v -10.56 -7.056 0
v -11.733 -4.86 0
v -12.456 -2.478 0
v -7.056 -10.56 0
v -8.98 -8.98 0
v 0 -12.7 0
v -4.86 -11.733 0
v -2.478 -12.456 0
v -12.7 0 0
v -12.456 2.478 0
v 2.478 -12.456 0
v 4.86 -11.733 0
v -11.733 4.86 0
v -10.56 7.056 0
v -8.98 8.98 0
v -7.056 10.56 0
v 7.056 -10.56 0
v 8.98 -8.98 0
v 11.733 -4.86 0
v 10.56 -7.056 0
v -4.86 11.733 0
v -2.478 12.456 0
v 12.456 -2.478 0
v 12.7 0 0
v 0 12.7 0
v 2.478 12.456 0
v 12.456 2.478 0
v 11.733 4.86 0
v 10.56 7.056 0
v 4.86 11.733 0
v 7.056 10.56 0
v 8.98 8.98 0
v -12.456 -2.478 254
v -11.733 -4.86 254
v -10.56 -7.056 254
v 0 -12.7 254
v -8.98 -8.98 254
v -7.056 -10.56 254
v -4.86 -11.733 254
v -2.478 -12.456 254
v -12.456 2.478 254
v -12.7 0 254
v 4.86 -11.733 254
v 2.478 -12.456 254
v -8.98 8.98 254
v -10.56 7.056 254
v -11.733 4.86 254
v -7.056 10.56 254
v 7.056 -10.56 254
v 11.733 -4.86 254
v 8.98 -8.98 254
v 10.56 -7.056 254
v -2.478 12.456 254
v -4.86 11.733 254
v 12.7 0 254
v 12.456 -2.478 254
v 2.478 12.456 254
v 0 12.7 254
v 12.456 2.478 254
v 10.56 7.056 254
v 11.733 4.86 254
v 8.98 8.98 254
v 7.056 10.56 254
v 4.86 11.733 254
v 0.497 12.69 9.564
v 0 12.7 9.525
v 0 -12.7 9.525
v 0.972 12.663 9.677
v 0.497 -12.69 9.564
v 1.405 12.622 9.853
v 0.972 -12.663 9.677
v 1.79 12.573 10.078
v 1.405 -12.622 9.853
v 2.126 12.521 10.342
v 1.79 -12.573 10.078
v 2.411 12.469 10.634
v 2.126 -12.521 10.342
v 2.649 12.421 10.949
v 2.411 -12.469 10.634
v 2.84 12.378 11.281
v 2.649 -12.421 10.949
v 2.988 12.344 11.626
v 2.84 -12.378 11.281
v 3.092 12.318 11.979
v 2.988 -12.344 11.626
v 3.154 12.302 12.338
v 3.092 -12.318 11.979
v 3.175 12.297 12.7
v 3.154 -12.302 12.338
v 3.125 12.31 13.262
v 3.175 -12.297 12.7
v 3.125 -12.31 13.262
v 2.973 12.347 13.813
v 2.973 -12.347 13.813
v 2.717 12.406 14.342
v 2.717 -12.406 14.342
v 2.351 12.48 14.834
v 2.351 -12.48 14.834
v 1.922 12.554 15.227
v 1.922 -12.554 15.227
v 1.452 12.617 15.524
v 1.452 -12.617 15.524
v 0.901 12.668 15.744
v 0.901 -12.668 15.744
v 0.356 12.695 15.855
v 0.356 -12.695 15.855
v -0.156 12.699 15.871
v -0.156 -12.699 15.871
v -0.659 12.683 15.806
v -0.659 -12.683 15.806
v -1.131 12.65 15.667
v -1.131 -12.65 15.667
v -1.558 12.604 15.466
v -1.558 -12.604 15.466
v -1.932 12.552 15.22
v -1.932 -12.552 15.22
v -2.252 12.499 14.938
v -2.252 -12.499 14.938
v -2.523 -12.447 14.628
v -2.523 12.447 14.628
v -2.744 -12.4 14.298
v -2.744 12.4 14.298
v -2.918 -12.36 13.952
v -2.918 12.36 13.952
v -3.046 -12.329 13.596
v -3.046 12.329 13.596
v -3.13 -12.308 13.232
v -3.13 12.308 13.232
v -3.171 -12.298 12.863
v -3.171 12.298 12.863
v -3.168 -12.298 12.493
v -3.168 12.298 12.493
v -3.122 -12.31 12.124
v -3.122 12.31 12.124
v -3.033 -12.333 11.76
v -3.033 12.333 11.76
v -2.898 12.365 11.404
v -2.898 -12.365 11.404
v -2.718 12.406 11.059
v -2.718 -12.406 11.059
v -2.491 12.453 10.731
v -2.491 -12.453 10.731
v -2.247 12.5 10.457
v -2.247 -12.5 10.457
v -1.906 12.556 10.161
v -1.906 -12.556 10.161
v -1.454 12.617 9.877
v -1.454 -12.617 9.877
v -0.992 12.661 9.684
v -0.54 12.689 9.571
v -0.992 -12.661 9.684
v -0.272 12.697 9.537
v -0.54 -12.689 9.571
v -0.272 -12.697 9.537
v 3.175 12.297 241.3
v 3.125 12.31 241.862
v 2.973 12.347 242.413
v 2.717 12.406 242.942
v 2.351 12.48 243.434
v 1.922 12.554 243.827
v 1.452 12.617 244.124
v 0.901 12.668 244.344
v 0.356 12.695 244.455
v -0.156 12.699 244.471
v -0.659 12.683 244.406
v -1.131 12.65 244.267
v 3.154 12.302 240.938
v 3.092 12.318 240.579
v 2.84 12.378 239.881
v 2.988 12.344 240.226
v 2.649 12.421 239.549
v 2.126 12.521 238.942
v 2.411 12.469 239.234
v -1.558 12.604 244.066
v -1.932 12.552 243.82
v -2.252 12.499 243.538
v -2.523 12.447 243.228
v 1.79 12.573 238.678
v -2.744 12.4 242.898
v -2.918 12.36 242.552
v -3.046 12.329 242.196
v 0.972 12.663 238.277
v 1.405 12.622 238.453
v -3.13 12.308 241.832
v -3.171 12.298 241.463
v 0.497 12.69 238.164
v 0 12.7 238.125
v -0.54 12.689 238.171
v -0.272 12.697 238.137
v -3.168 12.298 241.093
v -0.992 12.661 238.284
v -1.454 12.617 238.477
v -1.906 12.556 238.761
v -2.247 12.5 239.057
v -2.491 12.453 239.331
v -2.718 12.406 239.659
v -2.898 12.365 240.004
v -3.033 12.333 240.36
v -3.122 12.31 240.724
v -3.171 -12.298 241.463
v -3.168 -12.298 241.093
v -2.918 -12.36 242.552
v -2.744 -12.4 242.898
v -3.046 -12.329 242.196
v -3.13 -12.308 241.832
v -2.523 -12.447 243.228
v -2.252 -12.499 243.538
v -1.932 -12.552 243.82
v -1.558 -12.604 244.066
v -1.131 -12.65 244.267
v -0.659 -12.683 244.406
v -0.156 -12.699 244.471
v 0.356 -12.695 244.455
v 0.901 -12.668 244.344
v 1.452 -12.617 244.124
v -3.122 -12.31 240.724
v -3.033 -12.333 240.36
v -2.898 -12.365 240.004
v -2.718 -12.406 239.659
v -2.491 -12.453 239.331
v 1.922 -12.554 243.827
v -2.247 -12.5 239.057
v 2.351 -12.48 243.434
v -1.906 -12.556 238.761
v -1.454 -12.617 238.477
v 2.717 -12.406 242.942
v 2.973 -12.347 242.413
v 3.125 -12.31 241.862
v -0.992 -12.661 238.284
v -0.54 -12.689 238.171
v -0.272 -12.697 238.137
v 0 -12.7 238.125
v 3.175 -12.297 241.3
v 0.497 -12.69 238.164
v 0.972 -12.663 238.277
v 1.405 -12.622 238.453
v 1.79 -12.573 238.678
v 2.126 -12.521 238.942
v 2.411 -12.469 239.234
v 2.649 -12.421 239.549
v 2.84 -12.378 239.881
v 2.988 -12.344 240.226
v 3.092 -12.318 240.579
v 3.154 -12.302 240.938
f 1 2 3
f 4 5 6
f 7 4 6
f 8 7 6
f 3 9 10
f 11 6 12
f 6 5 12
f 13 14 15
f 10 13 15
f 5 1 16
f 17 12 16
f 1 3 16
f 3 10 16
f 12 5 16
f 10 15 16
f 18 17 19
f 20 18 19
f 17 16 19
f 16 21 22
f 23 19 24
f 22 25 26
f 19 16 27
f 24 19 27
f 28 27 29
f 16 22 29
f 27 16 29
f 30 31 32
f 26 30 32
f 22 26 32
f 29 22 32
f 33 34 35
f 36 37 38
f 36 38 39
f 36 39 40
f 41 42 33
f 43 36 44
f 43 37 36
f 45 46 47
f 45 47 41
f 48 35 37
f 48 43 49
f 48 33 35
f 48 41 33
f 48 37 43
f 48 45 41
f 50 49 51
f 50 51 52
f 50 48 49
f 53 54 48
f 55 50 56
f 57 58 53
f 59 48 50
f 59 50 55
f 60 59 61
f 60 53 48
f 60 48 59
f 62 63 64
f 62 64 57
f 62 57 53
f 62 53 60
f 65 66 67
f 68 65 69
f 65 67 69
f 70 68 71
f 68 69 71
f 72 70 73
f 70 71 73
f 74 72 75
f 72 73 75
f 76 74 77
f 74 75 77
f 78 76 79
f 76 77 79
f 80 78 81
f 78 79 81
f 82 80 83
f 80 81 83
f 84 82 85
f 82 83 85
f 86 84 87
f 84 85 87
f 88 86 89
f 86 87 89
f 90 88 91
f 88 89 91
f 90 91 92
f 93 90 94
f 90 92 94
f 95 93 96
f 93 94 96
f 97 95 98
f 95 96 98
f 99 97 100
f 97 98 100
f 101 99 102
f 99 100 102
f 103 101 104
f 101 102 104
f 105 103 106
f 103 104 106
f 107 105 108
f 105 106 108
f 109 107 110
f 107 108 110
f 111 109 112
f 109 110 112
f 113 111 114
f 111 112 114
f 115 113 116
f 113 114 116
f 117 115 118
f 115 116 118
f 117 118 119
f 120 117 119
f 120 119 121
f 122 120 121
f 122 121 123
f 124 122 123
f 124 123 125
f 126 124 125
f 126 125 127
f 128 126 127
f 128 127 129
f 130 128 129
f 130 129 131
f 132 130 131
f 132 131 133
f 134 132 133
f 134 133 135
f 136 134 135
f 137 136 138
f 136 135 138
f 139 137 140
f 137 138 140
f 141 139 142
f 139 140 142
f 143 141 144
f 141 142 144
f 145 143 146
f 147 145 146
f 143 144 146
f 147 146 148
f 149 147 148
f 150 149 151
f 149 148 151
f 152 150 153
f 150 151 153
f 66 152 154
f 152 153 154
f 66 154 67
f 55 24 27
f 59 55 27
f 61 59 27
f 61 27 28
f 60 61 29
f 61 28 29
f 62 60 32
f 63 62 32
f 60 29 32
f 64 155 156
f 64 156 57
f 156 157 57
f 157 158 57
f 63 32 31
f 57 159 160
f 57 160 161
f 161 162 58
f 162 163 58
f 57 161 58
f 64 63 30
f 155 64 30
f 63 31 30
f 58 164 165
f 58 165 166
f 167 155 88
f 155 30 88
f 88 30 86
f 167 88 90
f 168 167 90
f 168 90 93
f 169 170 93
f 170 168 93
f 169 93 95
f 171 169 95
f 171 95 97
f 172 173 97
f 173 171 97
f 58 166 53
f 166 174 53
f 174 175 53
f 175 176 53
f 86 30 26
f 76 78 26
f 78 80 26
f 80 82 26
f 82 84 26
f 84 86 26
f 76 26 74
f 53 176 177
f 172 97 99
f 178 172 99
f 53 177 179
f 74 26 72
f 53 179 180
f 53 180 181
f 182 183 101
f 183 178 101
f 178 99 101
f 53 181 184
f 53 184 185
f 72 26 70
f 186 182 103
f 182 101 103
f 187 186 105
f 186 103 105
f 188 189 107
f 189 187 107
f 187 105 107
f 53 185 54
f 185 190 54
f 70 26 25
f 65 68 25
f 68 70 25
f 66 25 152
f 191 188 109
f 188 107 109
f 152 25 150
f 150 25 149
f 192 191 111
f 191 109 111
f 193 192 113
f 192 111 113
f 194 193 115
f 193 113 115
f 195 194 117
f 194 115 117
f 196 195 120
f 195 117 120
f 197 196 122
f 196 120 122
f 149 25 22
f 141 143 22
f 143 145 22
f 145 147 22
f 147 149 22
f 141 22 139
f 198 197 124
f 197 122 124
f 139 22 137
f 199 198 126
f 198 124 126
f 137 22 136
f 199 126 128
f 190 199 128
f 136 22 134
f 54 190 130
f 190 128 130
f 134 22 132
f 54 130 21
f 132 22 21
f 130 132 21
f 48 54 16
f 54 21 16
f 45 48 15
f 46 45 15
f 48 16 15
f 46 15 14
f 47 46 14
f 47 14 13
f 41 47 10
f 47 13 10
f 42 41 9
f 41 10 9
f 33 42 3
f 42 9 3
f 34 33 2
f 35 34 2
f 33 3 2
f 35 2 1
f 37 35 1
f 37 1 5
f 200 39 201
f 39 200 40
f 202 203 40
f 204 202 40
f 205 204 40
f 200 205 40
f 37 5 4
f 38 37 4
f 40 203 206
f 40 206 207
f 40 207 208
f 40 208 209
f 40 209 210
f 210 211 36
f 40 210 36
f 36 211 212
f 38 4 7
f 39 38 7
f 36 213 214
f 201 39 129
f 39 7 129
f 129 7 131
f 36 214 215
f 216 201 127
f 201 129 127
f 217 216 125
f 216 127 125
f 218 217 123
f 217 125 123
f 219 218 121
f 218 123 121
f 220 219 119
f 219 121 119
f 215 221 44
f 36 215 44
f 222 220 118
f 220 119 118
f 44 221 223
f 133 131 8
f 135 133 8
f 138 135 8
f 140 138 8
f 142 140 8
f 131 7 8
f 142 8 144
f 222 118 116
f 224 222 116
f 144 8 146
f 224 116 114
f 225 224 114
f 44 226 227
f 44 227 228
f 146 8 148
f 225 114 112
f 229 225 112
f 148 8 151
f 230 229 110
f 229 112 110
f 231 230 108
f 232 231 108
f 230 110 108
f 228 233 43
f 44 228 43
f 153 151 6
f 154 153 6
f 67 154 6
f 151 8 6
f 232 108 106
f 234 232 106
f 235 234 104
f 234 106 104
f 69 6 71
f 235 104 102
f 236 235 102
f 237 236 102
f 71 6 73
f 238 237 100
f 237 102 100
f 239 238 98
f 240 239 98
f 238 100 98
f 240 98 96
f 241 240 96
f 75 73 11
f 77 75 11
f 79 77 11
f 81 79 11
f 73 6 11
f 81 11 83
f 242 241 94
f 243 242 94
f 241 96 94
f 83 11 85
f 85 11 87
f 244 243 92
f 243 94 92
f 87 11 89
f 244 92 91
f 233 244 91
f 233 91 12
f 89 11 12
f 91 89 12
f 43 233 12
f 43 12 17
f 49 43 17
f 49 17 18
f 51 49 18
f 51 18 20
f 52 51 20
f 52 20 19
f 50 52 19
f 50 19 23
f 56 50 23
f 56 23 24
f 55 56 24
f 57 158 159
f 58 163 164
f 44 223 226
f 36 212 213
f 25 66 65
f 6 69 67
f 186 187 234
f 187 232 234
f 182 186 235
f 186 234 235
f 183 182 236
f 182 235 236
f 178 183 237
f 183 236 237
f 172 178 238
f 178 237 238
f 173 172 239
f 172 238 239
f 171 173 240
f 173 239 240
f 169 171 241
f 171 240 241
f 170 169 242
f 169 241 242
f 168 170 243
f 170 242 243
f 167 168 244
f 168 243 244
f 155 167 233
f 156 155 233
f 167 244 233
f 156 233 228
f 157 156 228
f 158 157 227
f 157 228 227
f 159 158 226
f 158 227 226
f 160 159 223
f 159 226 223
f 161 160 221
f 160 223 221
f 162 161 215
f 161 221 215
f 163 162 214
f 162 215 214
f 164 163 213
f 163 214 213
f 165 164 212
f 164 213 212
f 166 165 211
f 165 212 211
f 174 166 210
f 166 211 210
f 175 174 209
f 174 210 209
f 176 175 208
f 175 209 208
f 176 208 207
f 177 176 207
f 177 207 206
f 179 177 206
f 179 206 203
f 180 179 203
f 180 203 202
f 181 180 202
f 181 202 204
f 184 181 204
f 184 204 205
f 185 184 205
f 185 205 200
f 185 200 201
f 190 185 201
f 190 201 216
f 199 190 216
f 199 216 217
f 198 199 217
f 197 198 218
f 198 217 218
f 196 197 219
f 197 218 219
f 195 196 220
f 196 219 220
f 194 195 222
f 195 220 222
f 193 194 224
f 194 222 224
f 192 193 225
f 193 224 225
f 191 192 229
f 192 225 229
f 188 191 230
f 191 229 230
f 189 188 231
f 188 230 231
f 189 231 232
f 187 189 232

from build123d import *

# Parameters (mm, degrees)
F0_R          = 12.7
F1_DEPTH      = 254
F3_DEPTH      = 25.4
F3_DEPTH_BACK = 25.4
F5_DEPTH      = 25.4
F5_DEPTH_BACK = 25.4


with BuildPart() as f1:
    # F0 (on Top) → F1 (new body)
    with BuildSketch(Plane.XY):
        Circle(F0_R)
    extrude(amount=F1_DEPTH)

    # F2 (on Front) → F3 (cut, two sides)
    with BuildSketch(Plane.XZ) as f3_sk:
        with BuildLine():
            ThreePointArc((0, 9.525), (2.2450640303, 10.4549359697), (3.175, 12.7))
            ThreePointArc((3.175, 12.7), (-2.2450640303, 14.9450640303), (0, 9.525))
        make_face()
    extrude(amount=-F3_DEPTH, mode=Mode.SUBTRACT)
    extrude(f3_sk.sketch, amount=F3_DEPTH_BACK, mode=Mode.SUBTRACT)

    # F4 (on Front) → F5 (cut, two sides)
    with BuildSketch(Plane.XZ) as f5_sk:
        with BuildLine():
            ThreePointArc((0, 238.125), (2.2450640303, 239.0549359697), (3.175, 241.3))
            ThreePointArc((3.175, 241.3), (-2.2450640303, 243.5450640303), (0, 238.125))
        make_face()
    extrude(amount=-F5_DEPTH, mode=Mode.SUBTRACT)
    extrude(f5_sk.sketch, amount=F5_DEPTH_BACK, mode=Mode.SUBTRACT)


solid = f1.part
